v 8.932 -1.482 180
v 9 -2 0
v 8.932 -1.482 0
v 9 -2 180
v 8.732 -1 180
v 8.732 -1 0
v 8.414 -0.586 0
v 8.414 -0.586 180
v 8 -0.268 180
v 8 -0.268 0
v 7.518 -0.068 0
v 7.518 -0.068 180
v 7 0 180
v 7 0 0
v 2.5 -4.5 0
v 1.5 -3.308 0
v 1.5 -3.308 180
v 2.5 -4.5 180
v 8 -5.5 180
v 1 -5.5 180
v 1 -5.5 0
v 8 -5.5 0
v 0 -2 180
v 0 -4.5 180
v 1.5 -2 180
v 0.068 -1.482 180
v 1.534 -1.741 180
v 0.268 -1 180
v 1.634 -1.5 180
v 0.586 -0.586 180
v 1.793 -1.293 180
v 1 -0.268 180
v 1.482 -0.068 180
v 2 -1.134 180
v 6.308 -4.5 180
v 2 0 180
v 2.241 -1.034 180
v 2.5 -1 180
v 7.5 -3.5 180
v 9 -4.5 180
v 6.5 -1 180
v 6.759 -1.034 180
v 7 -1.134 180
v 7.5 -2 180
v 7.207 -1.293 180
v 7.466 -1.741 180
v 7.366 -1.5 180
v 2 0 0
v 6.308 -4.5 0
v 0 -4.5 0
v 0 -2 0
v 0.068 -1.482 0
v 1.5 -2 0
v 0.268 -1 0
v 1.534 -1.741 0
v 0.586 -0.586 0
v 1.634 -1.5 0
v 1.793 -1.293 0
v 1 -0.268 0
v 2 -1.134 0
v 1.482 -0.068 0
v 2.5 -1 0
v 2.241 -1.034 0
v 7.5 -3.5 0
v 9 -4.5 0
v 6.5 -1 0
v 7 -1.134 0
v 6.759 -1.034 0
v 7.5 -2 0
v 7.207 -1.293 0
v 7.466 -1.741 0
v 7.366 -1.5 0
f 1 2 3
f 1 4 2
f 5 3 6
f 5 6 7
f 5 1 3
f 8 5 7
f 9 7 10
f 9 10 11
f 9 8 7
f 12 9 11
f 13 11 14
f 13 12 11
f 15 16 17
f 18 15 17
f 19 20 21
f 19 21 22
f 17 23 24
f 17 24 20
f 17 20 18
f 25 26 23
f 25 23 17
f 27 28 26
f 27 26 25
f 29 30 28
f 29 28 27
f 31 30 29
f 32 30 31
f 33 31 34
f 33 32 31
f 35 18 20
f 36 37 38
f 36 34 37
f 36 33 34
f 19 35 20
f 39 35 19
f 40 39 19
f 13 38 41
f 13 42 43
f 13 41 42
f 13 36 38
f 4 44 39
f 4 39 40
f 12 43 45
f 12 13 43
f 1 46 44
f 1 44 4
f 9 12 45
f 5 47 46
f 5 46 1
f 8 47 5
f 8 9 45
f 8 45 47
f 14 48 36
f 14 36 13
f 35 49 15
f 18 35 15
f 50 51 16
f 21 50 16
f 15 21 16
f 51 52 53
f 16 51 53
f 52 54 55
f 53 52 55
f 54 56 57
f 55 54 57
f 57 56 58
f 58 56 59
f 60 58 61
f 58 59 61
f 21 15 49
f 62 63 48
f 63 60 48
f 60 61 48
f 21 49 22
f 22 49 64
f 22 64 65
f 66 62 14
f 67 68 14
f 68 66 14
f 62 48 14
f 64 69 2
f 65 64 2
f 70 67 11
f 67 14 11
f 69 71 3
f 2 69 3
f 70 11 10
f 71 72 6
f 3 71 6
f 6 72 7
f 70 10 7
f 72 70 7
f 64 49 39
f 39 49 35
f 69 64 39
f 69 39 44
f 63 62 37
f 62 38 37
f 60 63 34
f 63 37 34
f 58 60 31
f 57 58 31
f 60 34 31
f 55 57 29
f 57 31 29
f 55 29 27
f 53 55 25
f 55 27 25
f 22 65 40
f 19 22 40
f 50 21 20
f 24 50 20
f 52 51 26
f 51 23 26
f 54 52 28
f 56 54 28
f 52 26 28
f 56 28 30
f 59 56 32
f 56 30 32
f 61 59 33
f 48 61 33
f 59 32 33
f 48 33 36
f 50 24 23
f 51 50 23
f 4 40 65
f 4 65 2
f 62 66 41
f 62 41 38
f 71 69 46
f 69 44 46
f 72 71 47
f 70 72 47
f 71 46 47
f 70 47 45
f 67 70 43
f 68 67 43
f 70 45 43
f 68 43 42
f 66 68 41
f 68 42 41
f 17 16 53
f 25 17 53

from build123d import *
from OCP.BRepFilletAPI import BRepFilletAPI_MakeChamfer

# Parameters (mm, degrees)
SKETCH1_W           = 9
SKETCH1_H           = 5.5
BOSS_EXTRUDE1_DEPTH = 180
FILLET1_R           = 2
CHAMFER1_SIZE       = 1
SKETCH2_W           = 6
SKETCH2_H           = 3.5
CUT_EXTRUDE2_DEPTH  = 181.30876296
FILLET2_R           = 1
CHAMFER2_SIZE       = 1
CHAMFER2_SIZE2      = 1.191753593


with BuildPart() as part:
    # Sketch1 → Boss-Extrude1 (new body)
    with BuildSketch(Plane.XY):
        with Locations((4.5, -2.75)):
            Rectangle(SKETCH1_W, SKETCH1_H)
    extrude(amount=BOSS_EXTRUDE1_DEPTH)

    # Fillet1
    fillet1_edges = [part.edges().sort_by_distance(p)[0] for p in [
        (0, 0, 90),
        (9, 0, 90),
    ]]
    fillet(fillet1_edges, radius=FILLET1_R)

    # Chamfer1
    chamfer1_edges = [part.edges().sort_by_distance(p)[0] for p in [
        (9, -5.5, 90),
        (0, -5.5, 90),
    ]]
    chamfer(chamfer1_edges, length=CHAMFER1_SIZE)

    # Sketch2 → Cut-Extrude2 (cut, through all)
    with BuildSketch(Plane(origin=(0, 0, 0), x_dir=(-1, 0, 0), z_dir=(0, 0, -1))):
        with Locations((-4.5, -2.75)):
            Rectangle(SKETCH2_W, SKETCH2_H)
    extrude(amount=-CUT_EXTRUDE2_DEPTH, mode=Mode.SUBTRACT)

    # Fillet2
    fillet2_edges = [part.edges().sort_by_distance(p)[0] for p in [
        (7.5, -1, 90),
        (1.5, -1, 90),
    ]]
    fillet(fillet2_edges, radius=FILLET2_R)

    # Chamfer2: one chamfer whose edges measure the first distance from different faces: ONE call of the kernel's chamfer builder (chamfer() names one face for all edges)
    chamfer2_edges_1 = [part.edges().sort_by_distance(p)[0] for p in [
        (1.5, -4.5, 90),
    ]]
    chamfer2_side_1 = [part.faces().sort_by_distance(p)[0] for p in [
        (4.5, -4.5, 90),
    ]]
    chamfer2_edges_2 = [part.edges().sort_by_distance(p)[0] for p in [
        (7.5, -4.5, 90),
    ]]
    chamfer2_side_2 = [part.faces().sort_by_distance(p)[0] for p in [
        (7.5, -3.25, 90),
    ]]
    chamfer2 = BRepFilletAPI_MakeChamfer(part.part.solid().wrapped)
    for e in chamfer2_edges_1:
        chamfer2.Add(CHAMFER2_SIZE, CHAMFER2_SIZE2, e.wrapped, chamfer2_side_1[0].wrapped)  # the first distance lies on this face
    for e in chamfer2_edges_2:
        chamfer2.Add(CHAMFER2_SIZE, CHAMFER2_SIZE2, e.wrapped, chamfer2_side_2[0].wrapped)  # the first distance lies on this face
    add(Compound.cast(chamfer2.Shape()), mode=Mode.REPLACE)


solid = part.part
